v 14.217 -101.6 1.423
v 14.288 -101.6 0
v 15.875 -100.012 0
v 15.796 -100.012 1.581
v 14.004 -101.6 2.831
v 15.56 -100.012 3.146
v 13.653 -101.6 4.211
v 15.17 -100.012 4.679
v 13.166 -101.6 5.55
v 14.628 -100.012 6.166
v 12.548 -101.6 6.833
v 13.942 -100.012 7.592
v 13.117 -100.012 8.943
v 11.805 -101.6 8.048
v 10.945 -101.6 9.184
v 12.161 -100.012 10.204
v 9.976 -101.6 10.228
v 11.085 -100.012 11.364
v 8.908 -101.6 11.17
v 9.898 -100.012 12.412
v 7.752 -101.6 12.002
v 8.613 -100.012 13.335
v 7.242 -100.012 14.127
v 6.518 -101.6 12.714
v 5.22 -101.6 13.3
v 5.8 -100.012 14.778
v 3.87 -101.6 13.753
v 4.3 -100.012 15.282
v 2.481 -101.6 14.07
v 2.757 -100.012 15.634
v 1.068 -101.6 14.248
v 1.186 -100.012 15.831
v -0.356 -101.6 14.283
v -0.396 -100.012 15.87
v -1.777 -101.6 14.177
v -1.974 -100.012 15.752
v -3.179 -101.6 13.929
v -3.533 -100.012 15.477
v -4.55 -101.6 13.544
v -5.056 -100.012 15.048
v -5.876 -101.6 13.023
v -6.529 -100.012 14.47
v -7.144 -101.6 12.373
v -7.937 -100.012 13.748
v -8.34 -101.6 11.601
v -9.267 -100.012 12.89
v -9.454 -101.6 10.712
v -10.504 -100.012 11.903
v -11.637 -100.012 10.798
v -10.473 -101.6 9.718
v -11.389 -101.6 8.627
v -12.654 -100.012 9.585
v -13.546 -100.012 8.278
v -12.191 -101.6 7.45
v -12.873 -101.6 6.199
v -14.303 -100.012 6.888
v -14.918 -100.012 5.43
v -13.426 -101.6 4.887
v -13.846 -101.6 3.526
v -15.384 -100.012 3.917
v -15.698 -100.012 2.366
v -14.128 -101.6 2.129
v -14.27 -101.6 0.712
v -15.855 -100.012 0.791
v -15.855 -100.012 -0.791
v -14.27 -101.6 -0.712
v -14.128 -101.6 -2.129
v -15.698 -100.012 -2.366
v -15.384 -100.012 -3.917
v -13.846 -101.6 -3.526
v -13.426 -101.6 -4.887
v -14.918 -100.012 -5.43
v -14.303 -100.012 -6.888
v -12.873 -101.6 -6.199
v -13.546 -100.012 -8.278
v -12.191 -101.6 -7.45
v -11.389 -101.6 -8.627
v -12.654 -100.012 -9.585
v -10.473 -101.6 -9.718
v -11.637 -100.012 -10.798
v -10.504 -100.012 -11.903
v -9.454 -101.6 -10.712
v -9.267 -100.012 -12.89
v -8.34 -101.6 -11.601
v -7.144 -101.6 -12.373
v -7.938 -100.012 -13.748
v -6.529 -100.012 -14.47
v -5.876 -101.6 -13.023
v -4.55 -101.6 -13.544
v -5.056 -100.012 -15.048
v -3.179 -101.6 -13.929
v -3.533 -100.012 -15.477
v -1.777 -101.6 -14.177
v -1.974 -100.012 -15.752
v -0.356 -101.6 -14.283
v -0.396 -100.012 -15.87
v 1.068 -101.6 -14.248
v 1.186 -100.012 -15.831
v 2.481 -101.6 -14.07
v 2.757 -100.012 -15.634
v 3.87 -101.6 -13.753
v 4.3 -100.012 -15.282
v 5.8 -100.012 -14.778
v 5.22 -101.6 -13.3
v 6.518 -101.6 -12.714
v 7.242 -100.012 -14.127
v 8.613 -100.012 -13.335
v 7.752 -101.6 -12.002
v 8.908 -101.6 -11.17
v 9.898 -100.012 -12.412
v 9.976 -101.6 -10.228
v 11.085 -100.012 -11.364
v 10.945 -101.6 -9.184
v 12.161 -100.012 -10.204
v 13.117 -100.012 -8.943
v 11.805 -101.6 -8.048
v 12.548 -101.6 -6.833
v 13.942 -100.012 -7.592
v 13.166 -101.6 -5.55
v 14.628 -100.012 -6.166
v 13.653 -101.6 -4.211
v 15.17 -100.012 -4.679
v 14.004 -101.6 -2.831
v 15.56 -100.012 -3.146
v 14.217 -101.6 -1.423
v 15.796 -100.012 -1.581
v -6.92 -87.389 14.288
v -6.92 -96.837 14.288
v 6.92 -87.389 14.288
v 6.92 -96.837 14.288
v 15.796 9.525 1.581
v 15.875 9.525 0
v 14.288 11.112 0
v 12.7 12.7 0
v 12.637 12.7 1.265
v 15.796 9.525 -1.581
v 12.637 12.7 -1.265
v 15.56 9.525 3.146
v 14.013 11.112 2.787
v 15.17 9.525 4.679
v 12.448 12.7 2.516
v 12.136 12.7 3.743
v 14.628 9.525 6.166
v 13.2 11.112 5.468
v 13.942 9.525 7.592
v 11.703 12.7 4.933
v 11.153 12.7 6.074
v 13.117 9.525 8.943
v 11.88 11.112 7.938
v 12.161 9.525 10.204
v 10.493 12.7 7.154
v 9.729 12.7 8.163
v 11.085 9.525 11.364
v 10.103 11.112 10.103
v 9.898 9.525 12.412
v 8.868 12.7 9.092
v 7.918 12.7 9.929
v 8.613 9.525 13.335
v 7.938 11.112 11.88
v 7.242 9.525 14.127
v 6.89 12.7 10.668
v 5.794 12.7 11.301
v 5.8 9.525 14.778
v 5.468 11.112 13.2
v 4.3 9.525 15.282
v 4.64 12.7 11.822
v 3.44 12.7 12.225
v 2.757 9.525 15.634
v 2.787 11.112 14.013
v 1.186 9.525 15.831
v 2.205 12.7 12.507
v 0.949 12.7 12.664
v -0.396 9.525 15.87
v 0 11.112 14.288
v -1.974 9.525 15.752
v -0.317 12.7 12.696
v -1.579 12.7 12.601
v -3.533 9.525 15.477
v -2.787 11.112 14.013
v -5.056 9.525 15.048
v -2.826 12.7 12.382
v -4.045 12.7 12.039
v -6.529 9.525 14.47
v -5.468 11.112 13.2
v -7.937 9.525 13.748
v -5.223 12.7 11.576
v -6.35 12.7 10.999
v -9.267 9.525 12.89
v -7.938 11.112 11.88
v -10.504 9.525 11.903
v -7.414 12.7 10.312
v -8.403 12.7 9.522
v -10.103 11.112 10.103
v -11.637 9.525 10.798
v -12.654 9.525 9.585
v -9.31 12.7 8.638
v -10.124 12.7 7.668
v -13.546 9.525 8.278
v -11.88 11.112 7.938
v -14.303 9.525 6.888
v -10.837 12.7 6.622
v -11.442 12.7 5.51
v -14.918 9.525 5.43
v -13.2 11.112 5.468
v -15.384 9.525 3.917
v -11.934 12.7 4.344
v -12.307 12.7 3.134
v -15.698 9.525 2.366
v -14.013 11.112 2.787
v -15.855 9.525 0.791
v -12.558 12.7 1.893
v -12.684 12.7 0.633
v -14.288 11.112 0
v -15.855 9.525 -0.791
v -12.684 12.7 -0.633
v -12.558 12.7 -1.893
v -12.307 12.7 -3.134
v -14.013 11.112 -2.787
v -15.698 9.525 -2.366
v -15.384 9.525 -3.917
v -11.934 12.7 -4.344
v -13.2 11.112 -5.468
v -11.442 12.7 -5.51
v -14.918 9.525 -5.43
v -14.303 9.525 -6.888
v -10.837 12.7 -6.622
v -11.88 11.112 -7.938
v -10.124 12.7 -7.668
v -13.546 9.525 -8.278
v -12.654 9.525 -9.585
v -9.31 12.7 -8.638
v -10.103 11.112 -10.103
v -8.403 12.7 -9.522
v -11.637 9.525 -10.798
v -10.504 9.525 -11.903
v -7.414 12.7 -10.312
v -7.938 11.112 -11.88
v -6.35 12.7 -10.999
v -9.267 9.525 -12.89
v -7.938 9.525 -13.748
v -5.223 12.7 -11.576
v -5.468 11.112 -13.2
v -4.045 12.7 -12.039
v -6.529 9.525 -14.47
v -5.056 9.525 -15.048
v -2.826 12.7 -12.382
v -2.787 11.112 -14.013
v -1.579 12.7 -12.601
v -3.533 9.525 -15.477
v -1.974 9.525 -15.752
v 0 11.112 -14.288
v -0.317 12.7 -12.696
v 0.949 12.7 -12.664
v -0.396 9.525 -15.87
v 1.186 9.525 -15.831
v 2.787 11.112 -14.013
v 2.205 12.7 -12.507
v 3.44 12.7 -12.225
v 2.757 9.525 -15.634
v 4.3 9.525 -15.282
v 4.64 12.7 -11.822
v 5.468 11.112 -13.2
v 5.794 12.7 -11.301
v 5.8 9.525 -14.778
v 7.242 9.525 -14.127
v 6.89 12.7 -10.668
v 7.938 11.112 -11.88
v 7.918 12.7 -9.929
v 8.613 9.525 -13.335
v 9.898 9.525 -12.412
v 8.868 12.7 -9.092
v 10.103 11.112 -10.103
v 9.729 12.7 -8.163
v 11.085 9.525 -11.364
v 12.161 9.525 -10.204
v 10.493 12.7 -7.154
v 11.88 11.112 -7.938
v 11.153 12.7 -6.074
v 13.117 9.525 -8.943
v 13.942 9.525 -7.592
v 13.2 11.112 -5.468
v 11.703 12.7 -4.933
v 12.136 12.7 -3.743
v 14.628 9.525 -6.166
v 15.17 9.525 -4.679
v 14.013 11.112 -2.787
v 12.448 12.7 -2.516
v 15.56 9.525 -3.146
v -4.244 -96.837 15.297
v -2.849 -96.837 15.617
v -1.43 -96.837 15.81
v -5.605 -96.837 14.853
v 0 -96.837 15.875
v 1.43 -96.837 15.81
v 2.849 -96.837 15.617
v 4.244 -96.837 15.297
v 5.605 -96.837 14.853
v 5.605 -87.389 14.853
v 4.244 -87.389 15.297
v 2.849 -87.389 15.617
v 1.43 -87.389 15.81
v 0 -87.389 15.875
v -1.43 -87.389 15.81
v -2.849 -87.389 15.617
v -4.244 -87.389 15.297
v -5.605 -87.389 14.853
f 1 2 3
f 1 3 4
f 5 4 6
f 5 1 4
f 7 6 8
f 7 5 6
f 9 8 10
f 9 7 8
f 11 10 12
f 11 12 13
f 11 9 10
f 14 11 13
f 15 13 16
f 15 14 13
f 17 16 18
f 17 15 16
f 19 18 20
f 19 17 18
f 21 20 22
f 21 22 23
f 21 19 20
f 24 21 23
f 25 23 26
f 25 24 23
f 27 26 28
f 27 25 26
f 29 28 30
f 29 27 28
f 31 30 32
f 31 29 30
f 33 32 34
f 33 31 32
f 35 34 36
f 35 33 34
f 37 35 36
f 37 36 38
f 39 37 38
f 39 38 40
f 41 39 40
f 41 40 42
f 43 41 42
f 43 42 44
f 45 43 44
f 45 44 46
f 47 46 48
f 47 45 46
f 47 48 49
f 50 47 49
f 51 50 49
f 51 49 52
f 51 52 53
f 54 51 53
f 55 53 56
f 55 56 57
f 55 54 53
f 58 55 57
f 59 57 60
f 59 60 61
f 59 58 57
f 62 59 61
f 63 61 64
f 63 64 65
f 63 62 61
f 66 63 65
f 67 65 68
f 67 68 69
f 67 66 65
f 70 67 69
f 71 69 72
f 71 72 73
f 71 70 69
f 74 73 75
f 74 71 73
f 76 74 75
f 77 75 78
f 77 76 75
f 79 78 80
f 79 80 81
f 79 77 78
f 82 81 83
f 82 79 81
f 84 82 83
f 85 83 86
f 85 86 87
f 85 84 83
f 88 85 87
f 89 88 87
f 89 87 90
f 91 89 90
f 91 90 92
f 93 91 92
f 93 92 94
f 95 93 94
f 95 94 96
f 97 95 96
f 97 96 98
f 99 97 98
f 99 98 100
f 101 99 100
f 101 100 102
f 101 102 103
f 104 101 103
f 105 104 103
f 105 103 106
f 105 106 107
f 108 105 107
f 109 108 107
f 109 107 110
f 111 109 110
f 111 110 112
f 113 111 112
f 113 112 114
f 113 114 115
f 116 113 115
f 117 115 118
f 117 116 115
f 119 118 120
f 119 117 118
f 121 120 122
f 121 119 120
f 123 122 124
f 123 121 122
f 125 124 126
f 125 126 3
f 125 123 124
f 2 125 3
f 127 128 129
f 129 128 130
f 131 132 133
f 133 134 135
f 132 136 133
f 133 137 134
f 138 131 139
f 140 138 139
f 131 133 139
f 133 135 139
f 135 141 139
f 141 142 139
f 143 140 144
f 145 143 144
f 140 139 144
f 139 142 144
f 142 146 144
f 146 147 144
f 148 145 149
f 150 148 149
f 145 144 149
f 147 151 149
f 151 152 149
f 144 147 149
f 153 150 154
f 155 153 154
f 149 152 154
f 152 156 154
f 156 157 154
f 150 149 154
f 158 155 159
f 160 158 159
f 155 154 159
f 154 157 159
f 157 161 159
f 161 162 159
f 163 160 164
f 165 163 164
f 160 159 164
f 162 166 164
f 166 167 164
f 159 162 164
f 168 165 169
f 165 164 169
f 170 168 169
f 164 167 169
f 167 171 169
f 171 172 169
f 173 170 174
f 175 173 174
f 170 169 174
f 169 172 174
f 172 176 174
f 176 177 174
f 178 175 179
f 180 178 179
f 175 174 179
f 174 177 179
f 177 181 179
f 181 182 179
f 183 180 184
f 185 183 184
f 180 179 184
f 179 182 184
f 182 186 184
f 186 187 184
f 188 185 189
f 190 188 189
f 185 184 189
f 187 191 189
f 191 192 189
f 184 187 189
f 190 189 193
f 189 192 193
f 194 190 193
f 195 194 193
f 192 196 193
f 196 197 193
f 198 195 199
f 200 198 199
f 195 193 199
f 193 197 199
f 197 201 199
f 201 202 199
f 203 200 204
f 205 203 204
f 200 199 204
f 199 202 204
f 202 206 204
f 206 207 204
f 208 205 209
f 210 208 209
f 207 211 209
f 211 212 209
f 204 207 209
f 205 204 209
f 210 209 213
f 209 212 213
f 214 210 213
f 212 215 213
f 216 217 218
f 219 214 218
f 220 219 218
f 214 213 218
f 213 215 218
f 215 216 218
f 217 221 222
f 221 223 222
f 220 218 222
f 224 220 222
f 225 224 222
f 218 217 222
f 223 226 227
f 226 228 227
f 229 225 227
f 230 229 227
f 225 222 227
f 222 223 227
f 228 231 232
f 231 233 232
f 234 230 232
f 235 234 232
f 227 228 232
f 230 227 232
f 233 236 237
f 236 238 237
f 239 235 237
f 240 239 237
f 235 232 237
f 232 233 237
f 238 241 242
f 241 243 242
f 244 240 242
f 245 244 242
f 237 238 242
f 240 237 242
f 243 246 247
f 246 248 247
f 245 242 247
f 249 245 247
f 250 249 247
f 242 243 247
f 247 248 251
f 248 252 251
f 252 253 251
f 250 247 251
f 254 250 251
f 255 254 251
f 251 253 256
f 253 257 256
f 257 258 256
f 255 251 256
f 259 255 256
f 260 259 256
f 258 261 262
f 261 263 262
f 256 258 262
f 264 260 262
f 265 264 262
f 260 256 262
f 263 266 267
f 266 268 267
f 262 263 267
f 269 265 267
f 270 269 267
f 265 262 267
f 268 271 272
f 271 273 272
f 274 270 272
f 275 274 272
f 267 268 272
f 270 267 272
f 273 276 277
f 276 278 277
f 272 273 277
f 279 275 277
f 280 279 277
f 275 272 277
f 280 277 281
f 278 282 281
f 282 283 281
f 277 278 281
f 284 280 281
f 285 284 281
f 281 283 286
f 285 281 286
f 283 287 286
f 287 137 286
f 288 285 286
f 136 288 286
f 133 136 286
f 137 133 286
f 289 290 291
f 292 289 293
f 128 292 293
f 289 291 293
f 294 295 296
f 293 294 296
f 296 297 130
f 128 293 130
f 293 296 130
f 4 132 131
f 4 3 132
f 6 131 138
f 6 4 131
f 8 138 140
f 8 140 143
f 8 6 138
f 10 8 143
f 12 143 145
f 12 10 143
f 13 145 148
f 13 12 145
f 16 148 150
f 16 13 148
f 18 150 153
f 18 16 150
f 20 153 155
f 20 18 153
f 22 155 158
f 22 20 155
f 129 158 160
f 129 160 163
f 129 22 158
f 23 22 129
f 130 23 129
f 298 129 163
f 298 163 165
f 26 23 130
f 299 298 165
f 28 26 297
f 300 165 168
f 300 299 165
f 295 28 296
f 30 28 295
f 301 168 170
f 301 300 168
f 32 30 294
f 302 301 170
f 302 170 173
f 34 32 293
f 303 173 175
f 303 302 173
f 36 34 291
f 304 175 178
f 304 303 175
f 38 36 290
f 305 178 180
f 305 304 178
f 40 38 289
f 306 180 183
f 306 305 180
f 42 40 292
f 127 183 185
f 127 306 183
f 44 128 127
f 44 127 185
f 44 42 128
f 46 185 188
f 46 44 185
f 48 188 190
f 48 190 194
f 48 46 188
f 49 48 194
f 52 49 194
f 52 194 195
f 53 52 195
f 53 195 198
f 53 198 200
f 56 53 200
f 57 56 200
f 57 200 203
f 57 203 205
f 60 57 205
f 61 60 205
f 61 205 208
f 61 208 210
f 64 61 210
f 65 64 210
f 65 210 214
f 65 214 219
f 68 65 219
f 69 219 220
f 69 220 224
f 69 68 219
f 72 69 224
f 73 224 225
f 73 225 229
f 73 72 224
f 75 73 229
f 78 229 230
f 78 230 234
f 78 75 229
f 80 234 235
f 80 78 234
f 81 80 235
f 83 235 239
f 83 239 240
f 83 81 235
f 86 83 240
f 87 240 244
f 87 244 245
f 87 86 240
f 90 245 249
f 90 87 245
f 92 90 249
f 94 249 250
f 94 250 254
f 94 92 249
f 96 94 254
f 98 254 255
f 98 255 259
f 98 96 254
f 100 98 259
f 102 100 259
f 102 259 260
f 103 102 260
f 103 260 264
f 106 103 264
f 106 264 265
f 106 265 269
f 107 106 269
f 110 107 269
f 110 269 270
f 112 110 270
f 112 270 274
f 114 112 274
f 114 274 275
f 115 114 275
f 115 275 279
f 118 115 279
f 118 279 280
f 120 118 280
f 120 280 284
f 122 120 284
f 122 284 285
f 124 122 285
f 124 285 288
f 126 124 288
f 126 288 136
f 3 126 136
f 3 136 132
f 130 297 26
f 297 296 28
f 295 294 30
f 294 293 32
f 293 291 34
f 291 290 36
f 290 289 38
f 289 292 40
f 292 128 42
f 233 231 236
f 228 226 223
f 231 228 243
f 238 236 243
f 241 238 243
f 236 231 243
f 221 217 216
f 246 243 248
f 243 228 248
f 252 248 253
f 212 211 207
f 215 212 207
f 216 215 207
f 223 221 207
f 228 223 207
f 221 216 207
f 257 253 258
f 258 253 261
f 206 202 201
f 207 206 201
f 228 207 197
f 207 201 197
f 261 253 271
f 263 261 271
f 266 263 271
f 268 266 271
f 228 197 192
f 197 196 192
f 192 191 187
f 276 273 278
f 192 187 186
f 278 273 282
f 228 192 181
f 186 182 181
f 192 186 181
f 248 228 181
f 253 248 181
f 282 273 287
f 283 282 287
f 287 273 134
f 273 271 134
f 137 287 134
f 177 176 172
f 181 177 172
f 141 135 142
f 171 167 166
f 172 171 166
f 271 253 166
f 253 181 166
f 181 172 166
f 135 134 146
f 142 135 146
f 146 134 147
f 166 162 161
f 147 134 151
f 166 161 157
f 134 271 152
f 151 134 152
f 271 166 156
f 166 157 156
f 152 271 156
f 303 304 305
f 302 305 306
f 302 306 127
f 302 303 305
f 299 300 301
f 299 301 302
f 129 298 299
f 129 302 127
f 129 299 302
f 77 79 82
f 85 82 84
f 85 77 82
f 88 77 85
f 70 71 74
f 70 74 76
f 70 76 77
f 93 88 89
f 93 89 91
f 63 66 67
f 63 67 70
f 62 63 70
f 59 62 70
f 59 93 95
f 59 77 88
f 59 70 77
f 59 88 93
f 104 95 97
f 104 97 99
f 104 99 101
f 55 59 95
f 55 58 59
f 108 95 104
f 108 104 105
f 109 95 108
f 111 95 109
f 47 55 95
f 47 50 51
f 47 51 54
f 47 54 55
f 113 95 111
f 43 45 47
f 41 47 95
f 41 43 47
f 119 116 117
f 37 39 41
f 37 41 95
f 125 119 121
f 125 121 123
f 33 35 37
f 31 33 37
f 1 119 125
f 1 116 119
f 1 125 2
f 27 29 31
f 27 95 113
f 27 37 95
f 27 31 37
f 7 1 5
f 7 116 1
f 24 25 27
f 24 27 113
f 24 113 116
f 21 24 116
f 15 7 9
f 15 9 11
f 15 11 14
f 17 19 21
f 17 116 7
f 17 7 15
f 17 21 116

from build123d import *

# Parameters (mm, degrees)
F0_R          = 15.875
F1_DEPTH      = 101.6
F1_DEPTH_BACK = 12.7
F2_SIZE       = 1.5875
F3_SIZE       = 3.175
F5_START      = -4.7625
F5_DEPTH      = 9.4488


with BuildPart() as f1:
    # F0 (on Front) → F1 (new body, two sides)
    with BuildSketch(Plane.XZ) as f1_sk:
        Circle(F0_R)
    extrude(amount=F1_DEPTH)
    extrude(f1_sk.sketch, amount=-F1_DEPTH_BACK)

    # F2
    f2_edges = [f1.edges().sort_by_distance(p)[0] for p in [
        (-15.875, -101.6, 0),
    ]]
    chamfer(f2_edges, length=F2_SIZE)

    # F3
    f3_edges = [f1.edges().sort_by_distance(p)[0] for p in [
        (-15.875, 12.7, 0),
    ]]
    chamfer(f3_edges, length=F3_SIZE)

    # F4 (on face) → F5 (cut)
    with BuildSketch(Plane.XZ.offset(101.6).offset(F5_START)):
        with BuildLine():
            Line((0, 14.2875), (6.9197520729, 14.2875))
            ThreePointArc((6.9197520729, 14.2875), (0, 15.875), (-6.9197520729, 14.2875))
            Line((-6.9197520729, 14.2875), (0, 14.2875))
        make_face()
    extrude(amount=-F5_DEPTH, mode=Mode.SUBTRACT)


solid = f1.part
